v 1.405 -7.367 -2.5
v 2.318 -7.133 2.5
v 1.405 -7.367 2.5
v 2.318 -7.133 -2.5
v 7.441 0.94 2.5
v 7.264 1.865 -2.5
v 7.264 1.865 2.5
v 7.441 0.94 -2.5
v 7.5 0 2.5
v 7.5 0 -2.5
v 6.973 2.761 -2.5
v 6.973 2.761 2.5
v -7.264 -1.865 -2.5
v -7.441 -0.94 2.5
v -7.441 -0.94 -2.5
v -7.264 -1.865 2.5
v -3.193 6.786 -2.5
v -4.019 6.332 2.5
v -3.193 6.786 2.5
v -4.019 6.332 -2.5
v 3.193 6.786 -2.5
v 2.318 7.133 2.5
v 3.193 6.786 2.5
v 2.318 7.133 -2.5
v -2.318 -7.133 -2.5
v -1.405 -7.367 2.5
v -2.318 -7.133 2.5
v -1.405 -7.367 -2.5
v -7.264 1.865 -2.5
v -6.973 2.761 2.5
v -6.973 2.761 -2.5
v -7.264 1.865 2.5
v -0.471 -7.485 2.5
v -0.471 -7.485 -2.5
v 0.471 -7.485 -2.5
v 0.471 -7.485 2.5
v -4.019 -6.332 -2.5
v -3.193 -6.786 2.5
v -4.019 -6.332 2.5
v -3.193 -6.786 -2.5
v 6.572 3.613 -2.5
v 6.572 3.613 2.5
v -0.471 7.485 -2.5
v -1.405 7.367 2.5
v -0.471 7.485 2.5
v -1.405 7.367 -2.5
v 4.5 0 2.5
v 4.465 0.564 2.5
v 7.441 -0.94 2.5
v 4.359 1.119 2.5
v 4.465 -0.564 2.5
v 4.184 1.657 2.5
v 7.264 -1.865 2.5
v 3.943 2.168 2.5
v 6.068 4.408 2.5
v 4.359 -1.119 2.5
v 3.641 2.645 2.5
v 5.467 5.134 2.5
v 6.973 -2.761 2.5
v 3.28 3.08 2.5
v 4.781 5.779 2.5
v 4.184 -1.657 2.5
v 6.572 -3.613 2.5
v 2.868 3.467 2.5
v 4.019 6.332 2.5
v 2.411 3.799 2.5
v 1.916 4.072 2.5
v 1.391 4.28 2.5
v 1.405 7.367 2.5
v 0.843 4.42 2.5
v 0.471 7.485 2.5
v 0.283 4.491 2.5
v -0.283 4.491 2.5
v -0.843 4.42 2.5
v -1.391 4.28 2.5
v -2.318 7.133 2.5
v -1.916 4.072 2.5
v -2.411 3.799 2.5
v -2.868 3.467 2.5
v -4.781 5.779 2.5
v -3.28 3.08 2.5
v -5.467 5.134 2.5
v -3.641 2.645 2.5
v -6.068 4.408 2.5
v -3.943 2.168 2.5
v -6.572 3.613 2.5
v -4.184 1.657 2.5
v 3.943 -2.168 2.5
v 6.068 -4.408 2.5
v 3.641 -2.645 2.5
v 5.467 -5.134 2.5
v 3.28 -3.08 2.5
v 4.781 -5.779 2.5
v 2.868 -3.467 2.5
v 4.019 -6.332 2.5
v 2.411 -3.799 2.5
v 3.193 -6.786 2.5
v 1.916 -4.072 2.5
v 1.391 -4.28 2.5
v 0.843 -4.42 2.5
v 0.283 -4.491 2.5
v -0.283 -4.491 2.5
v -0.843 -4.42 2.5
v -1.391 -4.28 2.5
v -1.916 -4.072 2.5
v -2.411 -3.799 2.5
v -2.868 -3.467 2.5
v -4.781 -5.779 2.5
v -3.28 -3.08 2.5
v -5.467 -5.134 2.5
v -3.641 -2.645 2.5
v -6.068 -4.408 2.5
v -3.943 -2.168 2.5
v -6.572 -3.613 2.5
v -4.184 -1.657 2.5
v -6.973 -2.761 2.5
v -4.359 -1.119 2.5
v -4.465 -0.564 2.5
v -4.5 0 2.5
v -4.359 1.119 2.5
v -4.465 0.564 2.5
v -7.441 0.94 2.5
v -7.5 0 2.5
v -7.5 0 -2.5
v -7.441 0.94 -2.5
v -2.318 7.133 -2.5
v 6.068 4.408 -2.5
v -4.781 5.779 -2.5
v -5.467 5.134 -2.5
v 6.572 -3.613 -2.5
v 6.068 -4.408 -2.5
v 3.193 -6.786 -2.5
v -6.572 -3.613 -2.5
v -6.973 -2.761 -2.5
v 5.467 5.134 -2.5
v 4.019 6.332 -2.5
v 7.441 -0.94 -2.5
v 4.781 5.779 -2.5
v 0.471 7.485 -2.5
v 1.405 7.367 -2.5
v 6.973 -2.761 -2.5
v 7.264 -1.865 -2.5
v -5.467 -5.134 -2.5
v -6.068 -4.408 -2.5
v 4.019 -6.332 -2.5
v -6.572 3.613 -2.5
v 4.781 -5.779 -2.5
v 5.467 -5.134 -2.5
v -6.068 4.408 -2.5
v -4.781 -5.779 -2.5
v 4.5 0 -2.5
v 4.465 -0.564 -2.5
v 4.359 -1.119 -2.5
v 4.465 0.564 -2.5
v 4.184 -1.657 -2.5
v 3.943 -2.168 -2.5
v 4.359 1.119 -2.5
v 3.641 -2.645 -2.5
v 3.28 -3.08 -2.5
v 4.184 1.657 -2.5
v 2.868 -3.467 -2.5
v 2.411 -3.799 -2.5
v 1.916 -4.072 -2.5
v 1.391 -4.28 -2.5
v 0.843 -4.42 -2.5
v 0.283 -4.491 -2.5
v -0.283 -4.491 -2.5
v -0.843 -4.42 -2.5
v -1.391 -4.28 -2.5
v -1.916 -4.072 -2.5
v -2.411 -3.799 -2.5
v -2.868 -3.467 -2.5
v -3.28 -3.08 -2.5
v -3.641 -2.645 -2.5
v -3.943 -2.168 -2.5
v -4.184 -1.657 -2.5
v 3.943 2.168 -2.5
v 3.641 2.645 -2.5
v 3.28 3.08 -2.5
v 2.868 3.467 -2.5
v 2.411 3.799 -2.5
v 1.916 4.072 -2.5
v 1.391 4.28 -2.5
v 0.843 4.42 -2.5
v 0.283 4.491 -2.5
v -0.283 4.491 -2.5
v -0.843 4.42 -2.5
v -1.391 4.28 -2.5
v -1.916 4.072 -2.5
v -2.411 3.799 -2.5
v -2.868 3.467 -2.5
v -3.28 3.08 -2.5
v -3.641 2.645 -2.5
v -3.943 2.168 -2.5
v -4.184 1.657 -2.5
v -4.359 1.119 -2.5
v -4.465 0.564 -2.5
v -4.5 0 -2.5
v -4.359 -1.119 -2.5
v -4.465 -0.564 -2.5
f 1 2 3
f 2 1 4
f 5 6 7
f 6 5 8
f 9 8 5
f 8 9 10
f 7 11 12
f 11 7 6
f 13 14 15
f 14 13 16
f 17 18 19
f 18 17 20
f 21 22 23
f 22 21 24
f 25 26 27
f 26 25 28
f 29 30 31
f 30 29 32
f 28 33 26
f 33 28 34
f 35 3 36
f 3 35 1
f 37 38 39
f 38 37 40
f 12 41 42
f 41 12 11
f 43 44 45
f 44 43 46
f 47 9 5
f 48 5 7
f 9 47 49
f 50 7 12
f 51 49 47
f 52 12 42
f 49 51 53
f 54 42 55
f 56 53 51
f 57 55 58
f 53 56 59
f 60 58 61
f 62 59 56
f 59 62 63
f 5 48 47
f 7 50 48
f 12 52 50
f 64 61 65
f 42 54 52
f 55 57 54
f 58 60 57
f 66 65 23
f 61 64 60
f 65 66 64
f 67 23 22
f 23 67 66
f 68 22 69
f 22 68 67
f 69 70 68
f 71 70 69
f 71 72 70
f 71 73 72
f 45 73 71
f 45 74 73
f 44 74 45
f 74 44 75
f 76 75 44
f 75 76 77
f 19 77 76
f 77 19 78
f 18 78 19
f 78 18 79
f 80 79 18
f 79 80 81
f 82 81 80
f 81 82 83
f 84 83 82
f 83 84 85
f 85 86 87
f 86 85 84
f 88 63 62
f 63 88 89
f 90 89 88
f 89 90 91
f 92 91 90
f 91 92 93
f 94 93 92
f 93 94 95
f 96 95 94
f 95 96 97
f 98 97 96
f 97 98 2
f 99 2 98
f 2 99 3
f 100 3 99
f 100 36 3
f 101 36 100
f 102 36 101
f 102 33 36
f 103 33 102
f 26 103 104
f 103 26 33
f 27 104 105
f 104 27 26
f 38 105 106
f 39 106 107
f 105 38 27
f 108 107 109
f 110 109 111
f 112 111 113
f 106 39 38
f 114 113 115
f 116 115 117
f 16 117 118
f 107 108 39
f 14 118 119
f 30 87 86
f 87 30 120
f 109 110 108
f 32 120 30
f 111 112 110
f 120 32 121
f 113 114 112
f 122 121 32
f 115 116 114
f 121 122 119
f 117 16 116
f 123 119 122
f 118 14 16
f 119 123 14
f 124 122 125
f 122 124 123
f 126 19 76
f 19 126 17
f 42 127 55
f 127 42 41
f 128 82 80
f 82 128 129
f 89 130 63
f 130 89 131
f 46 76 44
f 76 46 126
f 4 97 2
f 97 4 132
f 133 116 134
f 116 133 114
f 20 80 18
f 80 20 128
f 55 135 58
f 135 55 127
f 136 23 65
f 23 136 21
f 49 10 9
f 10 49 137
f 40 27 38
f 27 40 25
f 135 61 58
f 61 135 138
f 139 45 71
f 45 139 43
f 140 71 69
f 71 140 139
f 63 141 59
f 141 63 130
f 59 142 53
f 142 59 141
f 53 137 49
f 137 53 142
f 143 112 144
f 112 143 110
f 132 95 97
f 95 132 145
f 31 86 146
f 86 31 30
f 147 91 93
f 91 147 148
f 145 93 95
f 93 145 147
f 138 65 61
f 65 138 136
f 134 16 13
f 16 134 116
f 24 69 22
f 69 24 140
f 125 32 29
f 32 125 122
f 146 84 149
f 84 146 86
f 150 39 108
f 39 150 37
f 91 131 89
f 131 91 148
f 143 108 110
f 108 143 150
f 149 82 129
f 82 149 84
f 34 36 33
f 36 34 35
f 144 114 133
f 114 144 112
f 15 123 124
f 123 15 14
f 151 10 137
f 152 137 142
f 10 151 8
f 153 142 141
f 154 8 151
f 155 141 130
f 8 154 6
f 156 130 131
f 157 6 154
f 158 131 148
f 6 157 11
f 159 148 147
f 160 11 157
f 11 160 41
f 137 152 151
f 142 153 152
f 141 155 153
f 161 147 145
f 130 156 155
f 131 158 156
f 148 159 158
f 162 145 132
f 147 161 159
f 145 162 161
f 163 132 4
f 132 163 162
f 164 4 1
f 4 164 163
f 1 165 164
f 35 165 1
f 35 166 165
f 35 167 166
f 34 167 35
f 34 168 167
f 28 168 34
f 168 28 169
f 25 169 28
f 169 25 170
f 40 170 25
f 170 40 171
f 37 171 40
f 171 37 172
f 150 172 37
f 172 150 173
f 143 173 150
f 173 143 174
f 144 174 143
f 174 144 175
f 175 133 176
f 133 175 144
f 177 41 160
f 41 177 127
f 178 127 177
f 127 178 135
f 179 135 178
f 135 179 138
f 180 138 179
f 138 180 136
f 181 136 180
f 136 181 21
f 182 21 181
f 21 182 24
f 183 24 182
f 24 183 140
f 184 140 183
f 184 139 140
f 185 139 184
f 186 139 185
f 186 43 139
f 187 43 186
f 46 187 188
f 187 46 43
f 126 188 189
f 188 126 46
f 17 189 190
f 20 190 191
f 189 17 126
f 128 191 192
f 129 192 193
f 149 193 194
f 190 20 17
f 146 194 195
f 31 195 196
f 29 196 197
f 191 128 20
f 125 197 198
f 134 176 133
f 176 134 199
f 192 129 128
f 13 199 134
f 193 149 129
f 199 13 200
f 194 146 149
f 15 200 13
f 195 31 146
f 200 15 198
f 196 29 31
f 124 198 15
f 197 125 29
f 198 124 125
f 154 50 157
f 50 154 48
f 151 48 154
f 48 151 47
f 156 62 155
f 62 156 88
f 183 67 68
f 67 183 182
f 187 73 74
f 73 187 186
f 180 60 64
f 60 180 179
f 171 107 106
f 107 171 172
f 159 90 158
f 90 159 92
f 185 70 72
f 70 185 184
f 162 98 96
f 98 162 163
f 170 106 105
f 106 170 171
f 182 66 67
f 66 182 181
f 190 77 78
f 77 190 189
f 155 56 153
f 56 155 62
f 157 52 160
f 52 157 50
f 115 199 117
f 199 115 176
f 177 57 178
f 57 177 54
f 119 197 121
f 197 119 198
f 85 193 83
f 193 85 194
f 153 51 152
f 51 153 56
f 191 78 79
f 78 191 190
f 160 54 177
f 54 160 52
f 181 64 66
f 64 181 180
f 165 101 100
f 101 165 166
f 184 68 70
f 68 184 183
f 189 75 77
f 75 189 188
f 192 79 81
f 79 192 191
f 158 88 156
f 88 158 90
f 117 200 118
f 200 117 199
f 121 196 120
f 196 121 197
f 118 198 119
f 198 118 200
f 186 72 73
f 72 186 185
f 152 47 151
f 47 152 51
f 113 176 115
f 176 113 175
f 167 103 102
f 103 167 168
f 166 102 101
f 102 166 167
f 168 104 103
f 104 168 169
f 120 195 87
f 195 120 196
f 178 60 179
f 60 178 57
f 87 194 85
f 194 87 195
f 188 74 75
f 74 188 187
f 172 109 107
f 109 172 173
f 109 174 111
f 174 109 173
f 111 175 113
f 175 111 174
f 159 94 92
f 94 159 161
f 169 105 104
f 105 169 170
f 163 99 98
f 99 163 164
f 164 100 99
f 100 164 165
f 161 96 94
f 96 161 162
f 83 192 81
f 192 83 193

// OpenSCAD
$fn = 50;


difference() {
	union() {
		translate(v = [0, 0, -2.5000000000]) {
			cylinder(h = 5, r = 7.5000000000);
		}
	}
	union() {
		translate(v = [0, 0, -100.0000000000]) {
			cylinder(h = 200, r = 4.5000000000);
		}
	}
}
